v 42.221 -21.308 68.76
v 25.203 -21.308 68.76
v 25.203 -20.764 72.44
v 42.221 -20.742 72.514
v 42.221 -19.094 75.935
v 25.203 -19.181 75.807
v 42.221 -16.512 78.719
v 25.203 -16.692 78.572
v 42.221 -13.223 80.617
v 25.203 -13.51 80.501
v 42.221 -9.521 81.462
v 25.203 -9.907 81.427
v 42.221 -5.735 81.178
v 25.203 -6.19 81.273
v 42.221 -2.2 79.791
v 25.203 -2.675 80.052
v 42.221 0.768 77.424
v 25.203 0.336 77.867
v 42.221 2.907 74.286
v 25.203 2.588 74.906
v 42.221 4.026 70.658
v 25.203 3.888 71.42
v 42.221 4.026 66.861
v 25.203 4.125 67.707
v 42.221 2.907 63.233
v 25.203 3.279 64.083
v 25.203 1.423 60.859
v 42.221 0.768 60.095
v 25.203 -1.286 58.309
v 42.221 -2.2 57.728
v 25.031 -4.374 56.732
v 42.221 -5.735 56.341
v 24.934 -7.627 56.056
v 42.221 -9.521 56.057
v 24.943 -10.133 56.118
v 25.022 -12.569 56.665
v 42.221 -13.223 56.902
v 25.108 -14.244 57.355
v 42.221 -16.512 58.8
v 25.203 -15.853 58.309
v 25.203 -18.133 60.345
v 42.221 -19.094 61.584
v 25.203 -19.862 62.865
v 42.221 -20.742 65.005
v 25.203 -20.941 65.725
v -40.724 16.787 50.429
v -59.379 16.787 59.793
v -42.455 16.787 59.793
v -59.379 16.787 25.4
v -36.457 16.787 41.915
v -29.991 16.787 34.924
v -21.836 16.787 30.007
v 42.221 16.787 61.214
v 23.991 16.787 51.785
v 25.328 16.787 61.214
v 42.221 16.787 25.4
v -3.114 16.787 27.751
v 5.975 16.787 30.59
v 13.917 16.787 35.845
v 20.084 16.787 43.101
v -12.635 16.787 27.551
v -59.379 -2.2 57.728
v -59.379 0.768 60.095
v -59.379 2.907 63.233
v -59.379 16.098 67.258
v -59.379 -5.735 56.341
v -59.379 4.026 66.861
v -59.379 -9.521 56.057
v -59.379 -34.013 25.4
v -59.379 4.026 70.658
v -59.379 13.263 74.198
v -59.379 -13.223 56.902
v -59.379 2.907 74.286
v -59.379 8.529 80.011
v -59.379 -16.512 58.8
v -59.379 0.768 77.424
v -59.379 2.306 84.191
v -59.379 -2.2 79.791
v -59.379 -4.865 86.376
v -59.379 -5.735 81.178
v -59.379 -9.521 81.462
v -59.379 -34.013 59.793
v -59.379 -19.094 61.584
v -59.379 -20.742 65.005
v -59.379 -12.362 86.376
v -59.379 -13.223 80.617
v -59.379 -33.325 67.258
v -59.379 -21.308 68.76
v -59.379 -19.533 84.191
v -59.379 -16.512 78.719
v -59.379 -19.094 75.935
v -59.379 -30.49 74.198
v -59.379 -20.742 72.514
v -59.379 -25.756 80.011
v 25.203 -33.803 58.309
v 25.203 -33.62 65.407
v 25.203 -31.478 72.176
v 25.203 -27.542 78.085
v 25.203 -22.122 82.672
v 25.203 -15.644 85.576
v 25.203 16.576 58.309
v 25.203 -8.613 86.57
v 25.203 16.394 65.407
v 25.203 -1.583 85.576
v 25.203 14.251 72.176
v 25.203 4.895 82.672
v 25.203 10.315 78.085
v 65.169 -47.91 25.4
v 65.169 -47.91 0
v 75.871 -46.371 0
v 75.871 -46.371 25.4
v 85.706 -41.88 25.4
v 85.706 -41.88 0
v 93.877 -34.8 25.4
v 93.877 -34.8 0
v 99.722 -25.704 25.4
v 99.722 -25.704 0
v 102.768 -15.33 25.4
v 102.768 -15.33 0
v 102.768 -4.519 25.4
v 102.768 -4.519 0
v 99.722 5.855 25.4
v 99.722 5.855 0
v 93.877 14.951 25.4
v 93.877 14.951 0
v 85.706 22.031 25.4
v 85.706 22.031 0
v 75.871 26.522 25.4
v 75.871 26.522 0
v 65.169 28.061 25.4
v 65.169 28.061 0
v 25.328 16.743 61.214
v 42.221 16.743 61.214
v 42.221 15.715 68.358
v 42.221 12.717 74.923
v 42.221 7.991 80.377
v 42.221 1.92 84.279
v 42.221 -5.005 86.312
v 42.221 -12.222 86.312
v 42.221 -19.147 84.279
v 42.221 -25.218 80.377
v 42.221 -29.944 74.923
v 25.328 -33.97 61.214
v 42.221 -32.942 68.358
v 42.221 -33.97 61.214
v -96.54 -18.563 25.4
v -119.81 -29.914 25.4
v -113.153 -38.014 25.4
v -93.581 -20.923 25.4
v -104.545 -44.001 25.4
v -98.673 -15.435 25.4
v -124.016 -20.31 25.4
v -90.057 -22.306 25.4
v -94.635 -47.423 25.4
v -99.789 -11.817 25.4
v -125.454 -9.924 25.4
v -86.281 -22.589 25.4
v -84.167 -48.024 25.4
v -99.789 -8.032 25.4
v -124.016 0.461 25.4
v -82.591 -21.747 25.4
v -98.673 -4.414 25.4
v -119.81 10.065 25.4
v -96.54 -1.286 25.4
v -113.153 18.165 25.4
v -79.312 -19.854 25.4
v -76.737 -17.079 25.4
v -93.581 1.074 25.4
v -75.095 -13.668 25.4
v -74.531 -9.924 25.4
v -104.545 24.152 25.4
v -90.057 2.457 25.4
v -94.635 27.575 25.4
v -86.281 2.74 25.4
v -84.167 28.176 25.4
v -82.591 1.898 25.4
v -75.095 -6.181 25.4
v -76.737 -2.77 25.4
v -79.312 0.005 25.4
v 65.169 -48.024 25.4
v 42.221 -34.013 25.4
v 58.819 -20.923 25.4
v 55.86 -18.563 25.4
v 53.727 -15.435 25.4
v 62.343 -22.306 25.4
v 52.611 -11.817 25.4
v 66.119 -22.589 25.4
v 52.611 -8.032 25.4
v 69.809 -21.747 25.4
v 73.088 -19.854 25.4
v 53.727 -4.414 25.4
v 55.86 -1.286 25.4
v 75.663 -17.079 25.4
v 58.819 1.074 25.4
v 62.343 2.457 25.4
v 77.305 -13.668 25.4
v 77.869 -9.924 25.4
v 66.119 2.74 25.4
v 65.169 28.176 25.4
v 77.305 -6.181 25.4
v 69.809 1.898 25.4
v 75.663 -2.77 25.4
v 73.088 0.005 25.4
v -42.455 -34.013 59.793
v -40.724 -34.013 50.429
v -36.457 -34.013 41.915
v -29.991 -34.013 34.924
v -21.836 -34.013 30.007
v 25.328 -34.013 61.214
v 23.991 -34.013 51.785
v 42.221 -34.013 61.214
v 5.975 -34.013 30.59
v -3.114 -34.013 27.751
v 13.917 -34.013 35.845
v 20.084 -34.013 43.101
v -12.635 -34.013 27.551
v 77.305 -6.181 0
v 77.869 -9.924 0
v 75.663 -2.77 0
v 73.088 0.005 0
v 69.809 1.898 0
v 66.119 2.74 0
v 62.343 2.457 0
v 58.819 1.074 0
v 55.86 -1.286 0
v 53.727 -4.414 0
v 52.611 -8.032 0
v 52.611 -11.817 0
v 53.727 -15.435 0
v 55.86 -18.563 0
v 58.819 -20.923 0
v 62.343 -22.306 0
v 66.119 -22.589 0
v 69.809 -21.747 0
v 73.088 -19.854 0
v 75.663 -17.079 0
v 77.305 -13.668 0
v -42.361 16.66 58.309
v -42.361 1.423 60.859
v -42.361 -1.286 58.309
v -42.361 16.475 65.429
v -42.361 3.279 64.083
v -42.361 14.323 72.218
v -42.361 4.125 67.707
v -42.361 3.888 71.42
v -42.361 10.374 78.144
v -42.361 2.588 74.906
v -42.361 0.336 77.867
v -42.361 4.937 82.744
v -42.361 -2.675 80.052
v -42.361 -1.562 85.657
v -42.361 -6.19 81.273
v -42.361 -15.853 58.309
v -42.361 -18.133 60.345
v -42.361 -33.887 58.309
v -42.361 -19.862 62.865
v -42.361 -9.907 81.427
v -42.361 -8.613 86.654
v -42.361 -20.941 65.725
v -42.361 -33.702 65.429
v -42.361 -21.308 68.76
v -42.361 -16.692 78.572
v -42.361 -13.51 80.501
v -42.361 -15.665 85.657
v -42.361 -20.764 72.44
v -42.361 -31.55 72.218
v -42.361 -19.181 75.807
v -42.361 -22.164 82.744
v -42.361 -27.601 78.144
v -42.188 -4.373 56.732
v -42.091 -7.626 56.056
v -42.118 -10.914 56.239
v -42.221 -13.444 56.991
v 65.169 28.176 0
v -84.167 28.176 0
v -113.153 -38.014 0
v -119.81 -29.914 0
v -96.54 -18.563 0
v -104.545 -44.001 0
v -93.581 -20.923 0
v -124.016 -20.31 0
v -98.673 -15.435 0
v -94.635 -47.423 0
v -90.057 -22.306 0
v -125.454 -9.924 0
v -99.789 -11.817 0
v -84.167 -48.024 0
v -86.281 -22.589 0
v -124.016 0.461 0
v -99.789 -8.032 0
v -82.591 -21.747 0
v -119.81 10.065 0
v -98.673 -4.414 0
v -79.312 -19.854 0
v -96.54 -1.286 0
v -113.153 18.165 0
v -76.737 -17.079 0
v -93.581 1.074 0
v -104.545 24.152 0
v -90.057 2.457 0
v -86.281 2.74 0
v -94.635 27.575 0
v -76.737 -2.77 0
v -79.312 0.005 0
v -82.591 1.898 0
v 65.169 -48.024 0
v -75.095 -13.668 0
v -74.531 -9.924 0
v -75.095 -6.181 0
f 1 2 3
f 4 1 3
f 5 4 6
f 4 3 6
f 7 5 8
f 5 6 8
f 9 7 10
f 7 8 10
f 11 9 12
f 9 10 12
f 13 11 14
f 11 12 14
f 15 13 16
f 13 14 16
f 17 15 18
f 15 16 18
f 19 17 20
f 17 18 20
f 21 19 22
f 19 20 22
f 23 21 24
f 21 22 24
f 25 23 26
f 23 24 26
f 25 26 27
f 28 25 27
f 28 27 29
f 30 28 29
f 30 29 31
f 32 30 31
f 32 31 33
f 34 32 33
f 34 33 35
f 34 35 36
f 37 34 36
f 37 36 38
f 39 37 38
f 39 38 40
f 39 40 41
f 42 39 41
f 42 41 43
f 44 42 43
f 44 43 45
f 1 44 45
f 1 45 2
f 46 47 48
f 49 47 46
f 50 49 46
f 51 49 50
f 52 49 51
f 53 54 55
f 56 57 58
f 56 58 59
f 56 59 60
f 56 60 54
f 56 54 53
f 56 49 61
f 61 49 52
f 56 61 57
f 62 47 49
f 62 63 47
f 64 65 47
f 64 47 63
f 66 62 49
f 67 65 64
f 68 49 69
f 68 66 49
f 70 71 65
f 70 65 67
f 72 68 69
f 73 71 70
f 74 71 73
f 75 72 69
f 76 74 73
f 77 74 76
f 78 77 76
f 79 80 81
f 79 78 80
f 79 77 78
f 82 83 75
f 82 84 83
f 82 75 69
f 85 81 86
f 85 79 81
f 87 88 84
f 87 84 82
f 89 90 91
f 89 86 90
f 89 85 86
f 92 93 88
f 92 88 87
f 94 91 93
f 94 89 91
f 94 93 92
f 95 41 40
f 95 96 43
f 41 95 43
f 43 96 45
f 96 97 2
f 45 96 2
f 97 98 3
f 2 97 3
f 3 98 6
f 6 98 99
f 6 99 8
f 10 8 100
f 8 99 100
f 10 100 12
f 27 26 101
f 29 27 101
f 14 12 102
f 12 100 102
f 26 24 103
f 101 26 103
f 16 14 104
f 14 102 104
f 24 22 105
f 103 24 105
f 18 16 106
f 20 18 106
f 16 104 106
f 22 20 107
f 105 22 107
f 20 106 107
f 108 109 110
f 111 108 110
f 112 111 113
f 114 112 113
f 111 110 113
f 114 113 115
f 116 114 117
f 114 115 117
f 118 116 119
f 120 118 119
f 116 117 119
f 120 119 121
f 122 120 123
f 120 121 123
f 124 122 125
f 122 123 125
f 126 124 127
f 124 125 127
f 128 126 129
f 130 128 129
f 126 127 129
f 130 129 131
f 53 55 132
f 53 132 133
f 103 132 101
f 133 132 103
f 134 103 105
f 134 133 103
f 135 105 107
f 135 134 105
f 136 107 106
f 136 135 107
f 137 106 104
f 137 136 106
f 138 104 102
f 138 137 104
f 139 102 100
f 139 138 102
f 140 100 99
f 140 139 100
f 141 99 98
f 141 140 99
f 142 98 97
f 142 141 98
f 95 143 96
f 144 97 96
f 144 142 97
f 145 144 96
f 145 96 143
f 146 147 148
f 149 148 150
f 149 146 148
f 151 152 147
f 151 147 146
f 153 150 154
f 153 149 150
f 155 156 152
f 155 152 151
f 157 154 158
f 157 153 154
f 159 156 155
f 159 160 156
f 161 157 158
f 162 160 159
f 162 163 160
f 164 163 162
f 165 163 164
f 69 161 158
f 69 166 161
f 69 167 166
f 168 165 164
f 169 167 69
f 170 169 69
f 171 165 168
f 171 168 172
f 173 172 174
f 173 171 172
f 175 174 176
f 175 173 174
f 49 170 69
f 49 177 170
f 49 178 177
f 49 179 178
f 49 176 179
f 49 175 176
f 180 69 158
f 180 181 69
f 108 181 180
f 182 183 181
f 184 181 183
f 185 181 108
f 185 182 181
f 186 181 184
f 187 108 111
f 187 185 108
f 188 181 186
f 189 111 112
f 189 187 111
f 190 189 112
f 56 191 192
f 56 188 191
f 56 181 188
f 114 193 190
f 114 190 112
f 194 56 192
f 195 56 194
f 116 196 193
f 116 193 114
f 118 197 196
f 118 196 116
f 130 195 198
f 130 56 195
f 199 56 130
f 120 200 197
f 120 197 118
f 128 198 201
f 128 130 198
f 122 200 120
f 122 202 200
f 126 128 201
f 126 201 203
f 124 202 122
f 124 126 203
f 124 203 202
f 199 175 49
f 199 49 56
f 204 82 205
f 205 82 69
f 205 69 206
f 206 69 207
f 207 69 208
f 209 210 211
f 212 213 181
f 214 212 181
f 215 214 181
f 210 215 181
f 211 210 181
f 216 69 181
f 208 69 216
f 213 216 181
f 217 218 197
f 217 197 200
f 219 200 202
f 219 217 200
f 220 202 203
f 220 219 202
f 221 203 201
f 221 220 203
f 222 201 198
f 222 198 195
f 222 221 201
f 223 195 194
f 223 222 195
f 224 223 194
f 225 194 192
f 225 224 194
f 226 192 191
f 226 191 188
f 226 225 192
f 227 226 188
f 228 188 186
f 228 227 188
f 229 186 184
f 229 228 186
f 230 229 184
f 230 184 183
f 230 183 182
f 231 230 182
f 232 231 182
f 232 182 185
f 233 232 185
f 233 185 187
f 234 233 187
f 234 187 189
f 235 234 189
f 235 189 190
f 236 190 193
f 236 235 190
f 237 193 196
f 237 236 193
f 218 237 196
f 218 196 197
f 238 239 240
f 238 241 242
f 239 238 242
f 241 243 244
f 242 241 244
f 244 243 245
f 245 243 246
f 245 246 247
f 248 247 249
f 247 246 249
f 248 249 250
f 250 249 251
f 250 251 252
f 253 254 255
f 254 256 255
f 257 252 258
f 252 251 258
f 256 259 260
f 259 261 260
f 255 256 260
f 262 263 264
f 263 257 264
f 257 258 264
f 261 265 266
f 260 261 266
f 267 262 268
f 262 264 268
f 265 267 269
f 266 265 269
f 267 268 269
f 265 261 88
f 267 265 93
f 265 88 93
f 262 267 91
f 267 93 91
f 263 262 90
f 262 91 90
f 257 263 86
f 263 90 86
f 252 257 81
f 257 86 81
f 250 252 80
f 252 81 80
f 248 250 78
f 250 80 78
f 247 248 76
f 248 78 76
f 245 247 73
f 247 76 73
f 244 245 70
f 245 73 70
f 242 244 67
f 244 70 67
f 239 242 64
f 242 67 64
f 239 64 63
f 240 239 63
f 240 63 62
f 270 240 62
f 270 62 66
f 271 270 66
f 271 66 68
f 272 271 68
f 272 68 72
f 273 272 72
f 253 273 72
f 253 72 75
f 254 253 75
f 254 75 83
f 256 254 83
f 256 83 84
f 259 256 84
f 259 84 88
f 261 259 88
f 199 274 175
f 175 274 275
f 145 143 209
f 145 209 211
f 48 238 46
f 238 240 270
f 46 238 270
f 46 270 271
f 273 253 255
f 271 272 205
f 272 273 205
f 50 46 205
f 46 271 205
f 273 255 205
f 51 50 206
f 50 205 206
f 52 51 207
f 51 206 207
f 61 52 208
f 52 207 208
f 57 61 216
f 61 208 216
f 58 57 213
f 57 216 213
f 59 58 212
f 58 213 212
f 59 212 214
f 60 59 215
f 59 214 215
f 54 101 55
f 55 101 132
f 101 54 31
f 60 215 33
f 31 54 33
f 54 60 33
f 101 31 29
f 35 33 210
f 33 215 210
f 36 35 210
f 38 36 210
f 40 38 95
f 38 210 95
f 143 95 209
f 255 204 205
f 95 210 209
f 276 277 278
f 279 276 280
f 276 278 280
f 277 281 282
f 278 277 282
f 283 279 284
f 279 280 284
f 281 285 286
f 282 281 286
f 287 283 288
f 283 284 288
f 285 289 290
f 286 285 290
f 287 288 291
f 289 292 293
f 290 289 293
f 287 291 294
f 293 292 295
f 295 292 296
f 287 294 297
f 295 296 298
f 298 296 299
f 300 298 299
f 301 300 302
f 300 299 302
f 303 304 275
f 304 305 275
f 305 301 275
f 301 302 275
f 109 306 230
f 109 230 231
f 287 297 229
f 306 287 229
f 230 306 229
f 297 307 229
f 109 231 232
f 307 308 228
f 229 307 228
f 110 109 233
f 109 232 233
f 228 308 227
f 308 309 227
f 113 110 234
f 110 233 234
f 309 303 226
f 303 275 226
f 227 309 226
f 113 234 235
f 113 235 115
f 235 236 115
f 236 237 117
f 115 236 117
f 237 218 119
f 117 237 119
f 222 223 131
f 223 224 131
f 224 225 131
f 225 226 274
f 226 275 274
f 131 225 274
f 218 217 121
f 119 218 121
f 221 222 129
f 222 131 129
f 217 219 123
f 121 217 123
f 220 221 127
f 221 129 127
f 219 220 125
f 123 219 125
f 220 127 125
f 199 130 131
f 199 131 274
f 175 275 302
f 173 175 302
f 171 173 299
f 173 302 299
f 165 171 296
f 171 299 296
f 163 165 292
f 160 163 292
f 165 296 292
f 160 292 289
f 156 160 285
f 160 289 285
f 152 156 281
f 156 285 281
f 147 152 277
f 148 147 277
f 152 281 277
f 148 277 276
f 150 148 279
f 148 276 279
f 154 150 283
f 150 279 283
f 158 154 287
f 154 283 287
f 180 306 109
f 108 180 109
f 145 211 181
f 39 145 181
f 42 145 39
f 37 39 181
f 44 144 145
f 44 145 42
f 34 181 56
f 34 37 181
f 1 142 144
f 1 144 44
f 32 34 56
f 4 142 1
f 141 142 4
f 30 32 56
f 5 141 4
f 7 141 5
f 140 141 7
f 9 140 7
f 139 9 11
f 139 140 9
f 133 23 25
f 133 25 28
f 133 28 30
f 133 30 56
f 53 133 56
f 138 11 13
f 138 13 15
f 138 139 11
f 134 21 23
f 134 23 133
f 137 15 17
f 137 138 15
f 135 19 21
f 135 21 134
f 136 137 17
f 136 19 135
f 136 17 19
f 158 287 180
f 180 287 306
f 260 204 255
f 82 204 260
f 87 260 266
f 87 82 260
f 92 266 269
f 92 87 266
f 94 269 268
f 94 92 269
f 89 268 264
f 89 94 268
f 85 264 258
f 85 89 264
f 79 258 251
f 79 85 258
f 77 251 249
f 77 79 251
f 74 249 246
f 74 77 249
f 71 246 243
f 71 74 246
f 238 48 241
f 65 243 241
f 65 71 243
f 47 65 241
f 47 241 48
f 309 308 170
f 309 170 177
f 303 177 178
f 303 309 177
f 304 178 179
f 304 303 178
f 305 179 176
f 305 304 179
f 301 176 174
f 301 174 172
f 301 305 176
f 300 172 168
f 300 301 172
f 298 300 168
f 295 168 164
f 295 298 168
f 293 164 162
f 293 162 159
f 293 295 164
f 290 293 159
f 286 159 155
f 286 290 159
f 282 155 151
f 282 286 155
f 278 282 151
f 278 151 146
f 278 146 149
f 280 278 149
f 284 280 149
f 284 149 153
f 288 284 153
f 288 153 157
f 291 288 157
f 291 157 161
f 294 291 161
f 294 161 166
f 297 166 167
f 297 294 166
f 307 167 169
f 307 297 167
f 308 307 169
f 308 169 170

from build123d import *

# Parameters (mm, degrees)
F0_R      = 12.7
F1_DEPTH  = 25.4
F2_W      = 101.6
F2_H      = 50.8
F3_DEPTH  = 35.814
F4_R      = 33.90667
F5_DEPTH  = 57.658
F6_R      = 25.439731
F7_DEPTH  = 17.018
F8_R      = 25.356047
F9_DEPTH  = 17.018
F10_R     = 12.738172
F11_DEPTH = 121.666


with BuildPart() as f1:
    # F0 (on Top) → F1 (new body)
    with BuildSketch(Plane.XY):
        with BuildLine():
            Line((65.169431, 28.175565), (-84.167217, 28.175565))
            ThreePointArc((-84.167217, 28.175565), (-125.453522, -9.924435), (-84.167217, -48.024435))
            Line((-84.167217, -48.024435), (65.169431, -48.024435))
            Line((65.169431, -48.024435), (65.169431, -47.909935))
            ThreePointArc((65.169431, -47.909935), (103.154932, -9.924435), (65.169431, 28.061066))
            Line((65.169431, 28.061066), (65.169431, 28.175565))
        make_face()
        with Locations((-87.230569, -9.924435)):
            Circle(F0_R, mode=Mode.SUBTRACT)
        with Locations((65.169431, -9.924435)):
            Circle(F0_R, mode=Mode.SUBTRACT)
    extrude(amount=F1_DEPTH)

    # F2 (on face) → F3 (join)
    with BuildSketch(Plane.XY.offset(25.4)):
        with Locations((-8.578566, -8.613469)):
            Rectangle(F2_W, F2_H)
    extrude(amount=F3_DEPTH)

    # F4 (on face) → F5 (cut)
    with BuildSketch(Plane.XZ.offset(34.013469)):
        with Locations((-8.578566, 61.214)):
            Circle(F4_R)
    extrude(amount=-F5_DEPTH, mode=Mode.SUBTRACT)

    # F6 (on face) → F7 (join)
    with BuildSketch(Plane(origin=(-59.378566, 0, 0), x_dir=(0, -1, 0), z_dir=(-1, 0, 0))):
        with Locations((8.613469, 61.214)):
            Circle(F6_R)
    extrude(amount=-F7_DEPTH)

    # F8 (on face) → F9 (join)
    with BuildSketch(Plane.YZ.offset(42.221434)):
        with Locations((-8.613469, 61.214)):
            Circle(F8_R)
    extrude(amount=-F9_DEPTH)

    # F10 (on face) → F11 (cut)
    with BuildSketch(Plane(origin=(-59.378566, 0, 0), x_dir=(0, -1, 0), z_dir=(-1, 0, 0))):
        with Locations((8.56952, 68.759516)):
            Circle(F10_R)
    extrude(amount=-F11_DEPTH, mode=Mode.SUBTRACT)


solid = f1.part
